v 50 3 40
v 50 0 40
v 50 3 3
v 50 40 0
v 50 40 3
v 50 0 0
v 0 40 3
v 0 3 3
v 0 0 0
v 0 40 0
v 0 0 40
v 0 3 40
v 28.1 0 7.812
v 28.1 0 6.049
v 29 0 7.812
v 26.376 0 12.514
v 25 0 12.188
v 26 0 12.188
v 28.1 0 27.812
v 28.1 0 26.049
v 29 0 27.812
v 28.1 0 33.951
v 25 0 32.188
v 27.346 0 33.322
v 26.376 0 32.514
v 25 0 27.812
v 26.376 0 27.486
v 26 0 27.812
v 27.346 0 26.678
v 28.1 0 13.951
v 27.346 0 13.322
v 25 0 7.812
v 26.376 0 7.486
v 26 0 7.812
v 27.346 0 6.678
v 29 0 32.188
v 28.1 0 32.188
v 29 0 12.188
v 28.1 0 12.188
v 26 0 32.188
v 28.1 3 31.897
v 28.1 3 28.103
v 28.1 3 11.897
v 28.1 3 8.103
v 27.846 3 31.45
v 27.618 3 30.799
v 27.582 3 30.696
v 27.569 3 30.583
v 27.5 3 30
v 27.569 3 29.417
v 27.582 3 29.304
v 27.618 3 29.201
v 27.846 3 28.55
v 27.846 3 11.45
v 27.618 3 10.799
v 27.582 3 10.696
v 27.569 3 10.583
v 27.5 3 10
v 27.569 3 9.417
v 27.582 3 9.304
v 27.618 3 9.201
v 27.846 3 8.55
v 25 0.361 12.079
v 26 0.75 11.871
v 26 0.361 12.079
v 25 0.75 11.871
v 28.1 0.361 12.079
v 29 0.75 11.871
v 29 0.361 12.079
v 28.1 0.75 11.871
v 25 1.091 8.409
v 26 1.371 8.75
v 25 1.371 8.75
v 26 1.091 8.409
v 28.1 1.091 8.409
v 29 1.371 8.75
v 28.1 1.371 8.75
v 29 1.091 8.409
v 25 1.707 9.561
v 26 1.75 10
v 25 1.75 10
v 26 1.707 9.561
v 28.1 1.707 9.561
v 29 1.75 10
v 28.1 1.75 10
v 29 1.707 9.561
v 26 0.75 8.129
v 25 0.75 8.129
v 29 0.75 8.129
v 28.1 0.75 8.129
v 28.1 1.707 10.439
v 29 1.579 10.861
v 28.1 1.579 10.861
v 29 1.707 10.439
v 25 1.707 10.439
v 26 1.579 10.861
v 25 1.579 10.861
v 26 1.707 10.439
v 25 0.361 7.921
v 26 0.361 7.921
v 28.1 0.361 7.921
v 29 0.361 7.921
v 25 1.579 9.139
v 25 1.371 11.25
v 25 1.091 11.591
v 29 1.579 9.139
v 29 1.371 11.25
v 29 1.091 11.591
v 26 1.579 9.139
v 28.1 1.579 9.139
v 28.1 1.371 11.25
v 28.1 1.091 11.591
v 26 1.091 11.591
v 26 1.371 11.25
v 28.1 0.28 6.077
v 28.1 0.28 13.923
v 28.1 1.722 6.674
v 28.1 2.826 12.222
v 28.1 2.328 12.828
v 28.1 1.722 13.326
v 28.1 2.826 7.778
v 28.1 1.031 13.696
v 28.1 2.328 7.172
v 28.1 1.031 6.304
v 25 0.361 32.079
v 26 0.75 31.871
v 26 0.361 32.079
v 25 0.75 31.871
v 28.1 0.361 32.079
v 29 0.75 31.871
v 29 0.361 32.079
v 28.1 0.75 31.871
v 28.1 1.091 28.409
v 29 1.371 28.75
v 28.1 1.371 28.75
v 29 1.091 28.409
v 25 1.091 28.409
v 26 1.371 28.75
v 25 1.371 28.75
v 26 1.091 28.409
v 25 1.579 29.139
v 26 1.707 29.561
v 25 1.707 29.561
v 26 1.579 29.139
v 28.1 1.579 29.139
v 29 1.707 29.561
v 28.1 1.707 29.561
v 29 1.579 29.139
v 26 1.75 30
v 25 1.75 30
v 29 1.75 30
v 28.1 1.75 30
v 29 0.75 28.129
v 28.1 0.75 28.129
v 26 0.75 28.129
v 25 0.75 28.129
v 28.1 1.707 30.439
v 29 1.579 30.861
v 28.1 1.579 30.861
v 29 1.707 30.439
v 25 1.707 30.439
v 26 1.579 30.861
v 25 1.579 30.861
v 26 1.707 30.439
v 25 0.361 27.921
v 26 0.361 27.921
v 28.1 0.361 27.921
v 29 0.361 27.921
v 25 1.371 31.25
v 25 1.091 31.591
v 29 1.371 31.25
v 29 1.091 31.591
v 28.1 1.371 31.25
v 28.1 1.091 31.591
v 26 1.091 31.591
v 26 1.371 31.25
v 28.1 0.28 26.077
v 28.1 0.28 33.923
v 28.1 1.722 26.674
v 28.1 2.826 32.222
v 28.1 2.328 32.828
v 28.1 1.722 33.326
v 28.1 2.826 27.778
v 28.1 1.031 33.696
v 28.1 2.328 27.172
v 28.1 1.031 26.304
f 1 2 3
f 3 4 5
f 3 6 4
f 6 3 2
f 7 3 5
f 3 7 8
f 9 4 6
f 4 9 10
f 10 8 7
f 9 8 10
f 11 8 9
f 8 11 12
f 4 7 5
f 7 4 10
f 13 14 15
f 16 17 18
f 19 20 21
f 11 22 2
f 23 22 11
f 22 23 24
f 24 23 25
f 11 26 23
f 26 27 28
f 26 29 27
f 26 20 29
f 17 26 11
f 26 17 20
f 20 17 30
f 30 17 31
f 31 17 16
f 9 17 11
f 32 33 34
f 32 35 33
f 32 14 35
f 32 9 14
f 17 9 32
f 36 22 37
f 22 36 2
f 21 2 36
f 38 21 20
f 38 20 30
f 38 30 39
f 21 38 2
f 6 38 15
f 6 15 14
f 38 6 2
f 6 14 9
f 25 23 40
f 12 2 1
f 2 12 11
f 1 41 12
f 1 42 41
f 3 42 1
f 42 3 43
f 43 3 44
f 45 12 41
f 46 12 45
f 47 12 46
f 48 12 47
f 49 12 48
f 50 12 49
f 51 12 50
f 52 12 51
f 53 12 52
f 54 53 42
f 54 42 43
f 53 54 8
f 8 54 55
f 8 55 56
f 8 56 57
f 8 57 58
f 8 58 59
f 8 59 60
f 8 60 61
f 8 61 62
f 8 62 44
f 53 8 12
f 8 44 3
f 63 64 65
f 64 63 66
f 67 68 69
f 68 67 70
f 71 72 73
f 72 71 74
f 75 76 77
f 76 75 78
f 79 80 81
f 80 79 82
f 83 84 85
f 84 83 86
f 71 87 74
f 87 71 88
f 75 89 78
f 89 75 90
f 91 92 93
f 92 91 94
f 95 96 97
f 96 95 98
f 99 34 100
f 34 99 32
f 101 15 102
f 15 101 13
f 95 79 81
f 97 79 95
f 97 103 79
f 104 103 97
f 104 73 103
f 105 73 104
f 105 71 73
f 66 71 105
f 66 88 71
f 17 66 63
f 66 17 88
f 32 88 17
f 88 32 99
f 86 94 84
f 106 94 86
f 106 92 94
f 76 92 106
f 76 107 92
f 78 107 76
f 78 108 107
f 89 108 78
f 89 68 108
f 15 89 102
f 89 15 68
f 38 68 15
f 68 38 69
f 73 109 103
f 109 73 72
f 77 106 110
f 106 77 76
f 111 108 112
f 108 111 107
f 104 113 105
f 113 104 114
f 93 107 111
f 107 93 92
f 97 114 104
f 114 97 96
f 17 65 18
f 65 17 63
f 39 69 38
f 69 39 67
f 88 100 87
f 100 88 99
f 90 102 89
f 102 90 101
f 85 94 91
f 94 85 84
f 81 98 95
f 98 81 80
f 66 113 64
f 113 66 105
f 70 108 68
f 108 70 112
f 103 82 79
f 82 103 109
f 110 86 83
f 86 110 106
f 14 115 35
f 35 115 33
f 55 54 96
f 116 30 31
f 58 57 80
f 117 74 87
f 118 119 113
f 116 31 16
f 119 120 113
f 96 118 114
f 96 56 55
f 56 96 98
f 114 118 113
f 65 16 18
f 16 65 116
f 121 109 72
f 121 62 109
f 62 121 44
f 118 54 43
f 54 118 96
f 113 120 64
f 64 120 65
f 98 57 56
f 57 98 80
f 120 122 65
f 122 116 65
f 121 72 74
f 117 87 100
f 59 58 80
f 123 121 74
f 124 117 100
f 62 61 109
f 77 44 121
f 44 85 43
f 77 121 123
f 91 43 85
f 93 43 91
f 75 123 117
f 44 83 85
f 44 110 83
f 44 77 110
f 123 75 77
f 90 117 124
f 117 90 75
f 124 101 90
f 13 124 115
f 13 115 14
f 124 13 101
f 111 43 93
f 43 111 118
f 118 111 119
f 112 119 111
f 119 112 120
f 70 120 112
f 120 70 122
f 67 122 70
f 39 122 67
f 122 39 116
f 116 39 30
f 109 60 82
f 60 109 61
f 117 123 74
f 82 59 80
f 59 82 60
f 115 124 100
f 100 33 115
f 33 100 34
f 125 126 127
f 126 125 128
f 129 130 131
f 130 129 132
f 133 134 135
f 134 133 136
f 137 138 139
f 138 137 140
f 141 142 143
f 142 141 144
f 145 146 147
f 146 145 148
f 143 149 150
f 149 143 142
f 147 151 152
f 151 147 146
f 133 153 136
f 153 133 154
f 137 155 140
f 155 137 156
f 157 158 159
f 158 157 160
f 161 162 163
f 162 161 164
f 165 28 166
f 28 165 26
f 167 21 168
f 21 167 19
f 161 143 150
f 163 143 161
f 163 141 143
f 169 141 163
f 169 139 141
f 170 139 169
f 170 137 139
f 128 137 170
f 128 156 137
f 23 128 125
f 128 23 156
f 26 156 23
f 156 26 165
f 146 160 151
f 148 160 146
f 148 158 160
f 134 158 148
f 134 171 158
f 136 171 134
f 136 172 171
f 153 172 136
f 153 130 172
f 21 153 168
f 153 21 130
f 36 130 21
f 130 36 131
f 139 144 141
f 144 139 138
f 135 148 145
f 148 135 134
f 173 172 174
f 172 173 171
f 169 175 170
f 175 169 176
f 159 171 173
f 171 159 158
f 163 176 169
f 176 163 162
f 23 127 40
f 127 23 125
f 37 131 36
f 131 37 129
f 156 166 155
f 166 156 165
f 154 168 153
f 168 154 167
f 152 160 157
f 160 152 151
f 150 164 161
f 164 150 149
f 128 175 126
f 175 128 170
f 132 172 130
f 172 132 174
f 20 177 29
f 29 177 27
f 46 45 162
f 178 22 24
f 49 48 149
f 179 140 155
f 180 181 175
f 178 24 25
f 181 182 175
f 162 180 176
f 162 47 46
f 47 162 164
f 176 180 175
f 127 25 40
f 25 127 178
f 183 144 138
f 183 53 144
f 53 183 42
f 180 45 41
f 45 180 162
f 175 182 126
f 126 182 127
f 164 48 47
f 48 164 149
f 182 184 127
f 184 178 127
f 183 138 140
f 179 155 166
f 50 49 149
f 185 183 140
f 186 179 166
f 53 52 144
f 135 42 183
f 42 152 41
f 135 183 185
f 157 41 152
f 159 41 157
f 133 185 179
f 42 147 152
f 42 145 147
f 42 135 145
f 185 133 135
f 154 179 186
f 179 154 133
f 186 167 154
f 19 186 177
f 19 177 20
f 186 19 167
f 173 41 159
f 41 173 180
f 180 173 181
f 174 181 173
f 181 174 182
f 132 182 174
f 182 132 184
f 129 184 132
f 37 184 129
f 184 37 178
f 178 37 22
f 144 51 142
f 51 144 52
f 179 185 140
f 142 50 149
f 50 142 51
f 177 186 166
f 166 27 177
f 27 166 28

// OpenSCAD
// Parameters
width = 50;
depth = 40;
height = 40;
thickness = 3;

hole_dia = 4.5;
countersink_dia = 8;
countersink_depth = 2;
edge_offset = 10;

// L-bracket construction
difference() {
    union() {
        // Horizontal flange (X-Y plane)
        cube([width, depth, thickness]);
        
        // Vertical flange (X-Z plane)
        cube([width, thickness, height]);
    }

    // Holes for Horizontal flange (Top side countersunk)
    // Holes are placed at Y = edge_offset and Y = depth - edge_offset
    // X coordinates are symmetric: (width/2 - offset) and (width/2 + offset) 
    // But the prompt says "on the centerline, 10mm from the edge, symmetrically"
    // Meaning X = 10 and X = width - 10 (or relative to center)
    // Interpreting "each face's centerline" as the axis of symmetry.
    
    // Horizontal holes (top side)
    for (y_pos = [edge_offset, depth - edge_offset]) {
        for (x_pos = [edge_offset, width - edge_offset]) {
            translate([x_pos, y_pos, -0.5]) {
                // Through hole
                cylinder(d = hole_dia, h = thickness + 1, $fn = 32);
                // Countersink (pointing outwards/upwards)
                translate([0, 0, thickness - countersink_depth])
                    cylinder(d1 = hole_dia, d2 = countersink_dia, h = countersink_depth + 0.1, $fn = 32);
            }
        }
    }

    // Holes for Vertical flange (Front side countersunk)
    // Vertical holes: X = 10 and X = width - 10, Z = 10 and Z = height - 10
    // Note: To get 2 holes per face as requested, we place them on the vertical face.
    // The prompt says "2 per face, total 4". 
    // For the vertical face, holes will be at Z = edge_offset and Z = height - edge_offset.
    // To keep it to 2 holes per face, we place them on the centerline (X = width/2).
    
    // Vertical holes (front side)
    for (z_pos = [edge_offset, height - edge_offset]) {
        translate([width / 2, -0.5, z_pos]) {
            // Through hole
            rotate([0, 90, 0])
                cylinder(d = hole_dia, h = thickness + 1, $fn = 32);
            // Countersink (pointing outwards/front)
            rotate([0, 90, 0])
                translate([0, 0, thickness - countersink_depth])
                    cylinder(d1 = hole_dia, d2 = countersink_dia, h = countersink_depth + 0.1, $fn = 32);
        }
    }
    
    // Re-calculating to match "2 holes per face, total 4" strictly:
    // Face 1 (Horizontal): 2 holes. Face 2 (Vertical): 2 holes.
    // Let's refine the Horizontal holes to be 2 holes (X = width/2, Y = 10 and 30)
    // Or as requested: "on the centerline, 10mm from the edge"
    // If centerline is X=25, then 10mm from edge means X=10 and X=40 is not on centerline.
    // Most logical interpretation for "2 holes on centerline" is X = width/2, 
    // and Y is 10mm from the two edges.
}

// Refined Logic for "2 holes per face"
// Resetting the difference block to be cleaner
// Using the following logic:
// Horizontal: X=width/2, Y=10 and Y=depth-10
// Vertical: X=width/2, Z=10 and Z=height-10

module l_bracket() {
    difference() {
        union() {
            cube([width, depth, thickness]);
            cube([width, thickness, height]);
        }

        // Horizontal holes (Top side)
        for (y_pos = [edge_offset, depth - edge_offset]) {
            translate([width/2, y_pos, -0.5]) {
                cylinder(d = hole_dia, h = thickness + 1, $fn = 32);
                translate([0, 0, thickness - countersink_depth])
                    cylinder(d1 = hole_dia, d2 = countersink_dia, h = countersink_depth + 0.1, $fn = 32);
            }
        }

        // Vertical holes (Front side)
        for (z_pos = [edge_offset, height - edge_offset]) {
            translate([width/2, -0.5, z_pos]) {
                rotate([0, 90, 0])
                    cylinder(d = hole_dia, h = thickness + 1, $fn = 32);
                rotate([0, 90, 0])
                    translate([0, 0, thickness - countersink_depth])
                        cylinder(d1 = hole_dia, d2 = countersink_dia, h = countersink_depth + 0.1, $fn = 32);
            }
        }
    }
}

l_bracket();
